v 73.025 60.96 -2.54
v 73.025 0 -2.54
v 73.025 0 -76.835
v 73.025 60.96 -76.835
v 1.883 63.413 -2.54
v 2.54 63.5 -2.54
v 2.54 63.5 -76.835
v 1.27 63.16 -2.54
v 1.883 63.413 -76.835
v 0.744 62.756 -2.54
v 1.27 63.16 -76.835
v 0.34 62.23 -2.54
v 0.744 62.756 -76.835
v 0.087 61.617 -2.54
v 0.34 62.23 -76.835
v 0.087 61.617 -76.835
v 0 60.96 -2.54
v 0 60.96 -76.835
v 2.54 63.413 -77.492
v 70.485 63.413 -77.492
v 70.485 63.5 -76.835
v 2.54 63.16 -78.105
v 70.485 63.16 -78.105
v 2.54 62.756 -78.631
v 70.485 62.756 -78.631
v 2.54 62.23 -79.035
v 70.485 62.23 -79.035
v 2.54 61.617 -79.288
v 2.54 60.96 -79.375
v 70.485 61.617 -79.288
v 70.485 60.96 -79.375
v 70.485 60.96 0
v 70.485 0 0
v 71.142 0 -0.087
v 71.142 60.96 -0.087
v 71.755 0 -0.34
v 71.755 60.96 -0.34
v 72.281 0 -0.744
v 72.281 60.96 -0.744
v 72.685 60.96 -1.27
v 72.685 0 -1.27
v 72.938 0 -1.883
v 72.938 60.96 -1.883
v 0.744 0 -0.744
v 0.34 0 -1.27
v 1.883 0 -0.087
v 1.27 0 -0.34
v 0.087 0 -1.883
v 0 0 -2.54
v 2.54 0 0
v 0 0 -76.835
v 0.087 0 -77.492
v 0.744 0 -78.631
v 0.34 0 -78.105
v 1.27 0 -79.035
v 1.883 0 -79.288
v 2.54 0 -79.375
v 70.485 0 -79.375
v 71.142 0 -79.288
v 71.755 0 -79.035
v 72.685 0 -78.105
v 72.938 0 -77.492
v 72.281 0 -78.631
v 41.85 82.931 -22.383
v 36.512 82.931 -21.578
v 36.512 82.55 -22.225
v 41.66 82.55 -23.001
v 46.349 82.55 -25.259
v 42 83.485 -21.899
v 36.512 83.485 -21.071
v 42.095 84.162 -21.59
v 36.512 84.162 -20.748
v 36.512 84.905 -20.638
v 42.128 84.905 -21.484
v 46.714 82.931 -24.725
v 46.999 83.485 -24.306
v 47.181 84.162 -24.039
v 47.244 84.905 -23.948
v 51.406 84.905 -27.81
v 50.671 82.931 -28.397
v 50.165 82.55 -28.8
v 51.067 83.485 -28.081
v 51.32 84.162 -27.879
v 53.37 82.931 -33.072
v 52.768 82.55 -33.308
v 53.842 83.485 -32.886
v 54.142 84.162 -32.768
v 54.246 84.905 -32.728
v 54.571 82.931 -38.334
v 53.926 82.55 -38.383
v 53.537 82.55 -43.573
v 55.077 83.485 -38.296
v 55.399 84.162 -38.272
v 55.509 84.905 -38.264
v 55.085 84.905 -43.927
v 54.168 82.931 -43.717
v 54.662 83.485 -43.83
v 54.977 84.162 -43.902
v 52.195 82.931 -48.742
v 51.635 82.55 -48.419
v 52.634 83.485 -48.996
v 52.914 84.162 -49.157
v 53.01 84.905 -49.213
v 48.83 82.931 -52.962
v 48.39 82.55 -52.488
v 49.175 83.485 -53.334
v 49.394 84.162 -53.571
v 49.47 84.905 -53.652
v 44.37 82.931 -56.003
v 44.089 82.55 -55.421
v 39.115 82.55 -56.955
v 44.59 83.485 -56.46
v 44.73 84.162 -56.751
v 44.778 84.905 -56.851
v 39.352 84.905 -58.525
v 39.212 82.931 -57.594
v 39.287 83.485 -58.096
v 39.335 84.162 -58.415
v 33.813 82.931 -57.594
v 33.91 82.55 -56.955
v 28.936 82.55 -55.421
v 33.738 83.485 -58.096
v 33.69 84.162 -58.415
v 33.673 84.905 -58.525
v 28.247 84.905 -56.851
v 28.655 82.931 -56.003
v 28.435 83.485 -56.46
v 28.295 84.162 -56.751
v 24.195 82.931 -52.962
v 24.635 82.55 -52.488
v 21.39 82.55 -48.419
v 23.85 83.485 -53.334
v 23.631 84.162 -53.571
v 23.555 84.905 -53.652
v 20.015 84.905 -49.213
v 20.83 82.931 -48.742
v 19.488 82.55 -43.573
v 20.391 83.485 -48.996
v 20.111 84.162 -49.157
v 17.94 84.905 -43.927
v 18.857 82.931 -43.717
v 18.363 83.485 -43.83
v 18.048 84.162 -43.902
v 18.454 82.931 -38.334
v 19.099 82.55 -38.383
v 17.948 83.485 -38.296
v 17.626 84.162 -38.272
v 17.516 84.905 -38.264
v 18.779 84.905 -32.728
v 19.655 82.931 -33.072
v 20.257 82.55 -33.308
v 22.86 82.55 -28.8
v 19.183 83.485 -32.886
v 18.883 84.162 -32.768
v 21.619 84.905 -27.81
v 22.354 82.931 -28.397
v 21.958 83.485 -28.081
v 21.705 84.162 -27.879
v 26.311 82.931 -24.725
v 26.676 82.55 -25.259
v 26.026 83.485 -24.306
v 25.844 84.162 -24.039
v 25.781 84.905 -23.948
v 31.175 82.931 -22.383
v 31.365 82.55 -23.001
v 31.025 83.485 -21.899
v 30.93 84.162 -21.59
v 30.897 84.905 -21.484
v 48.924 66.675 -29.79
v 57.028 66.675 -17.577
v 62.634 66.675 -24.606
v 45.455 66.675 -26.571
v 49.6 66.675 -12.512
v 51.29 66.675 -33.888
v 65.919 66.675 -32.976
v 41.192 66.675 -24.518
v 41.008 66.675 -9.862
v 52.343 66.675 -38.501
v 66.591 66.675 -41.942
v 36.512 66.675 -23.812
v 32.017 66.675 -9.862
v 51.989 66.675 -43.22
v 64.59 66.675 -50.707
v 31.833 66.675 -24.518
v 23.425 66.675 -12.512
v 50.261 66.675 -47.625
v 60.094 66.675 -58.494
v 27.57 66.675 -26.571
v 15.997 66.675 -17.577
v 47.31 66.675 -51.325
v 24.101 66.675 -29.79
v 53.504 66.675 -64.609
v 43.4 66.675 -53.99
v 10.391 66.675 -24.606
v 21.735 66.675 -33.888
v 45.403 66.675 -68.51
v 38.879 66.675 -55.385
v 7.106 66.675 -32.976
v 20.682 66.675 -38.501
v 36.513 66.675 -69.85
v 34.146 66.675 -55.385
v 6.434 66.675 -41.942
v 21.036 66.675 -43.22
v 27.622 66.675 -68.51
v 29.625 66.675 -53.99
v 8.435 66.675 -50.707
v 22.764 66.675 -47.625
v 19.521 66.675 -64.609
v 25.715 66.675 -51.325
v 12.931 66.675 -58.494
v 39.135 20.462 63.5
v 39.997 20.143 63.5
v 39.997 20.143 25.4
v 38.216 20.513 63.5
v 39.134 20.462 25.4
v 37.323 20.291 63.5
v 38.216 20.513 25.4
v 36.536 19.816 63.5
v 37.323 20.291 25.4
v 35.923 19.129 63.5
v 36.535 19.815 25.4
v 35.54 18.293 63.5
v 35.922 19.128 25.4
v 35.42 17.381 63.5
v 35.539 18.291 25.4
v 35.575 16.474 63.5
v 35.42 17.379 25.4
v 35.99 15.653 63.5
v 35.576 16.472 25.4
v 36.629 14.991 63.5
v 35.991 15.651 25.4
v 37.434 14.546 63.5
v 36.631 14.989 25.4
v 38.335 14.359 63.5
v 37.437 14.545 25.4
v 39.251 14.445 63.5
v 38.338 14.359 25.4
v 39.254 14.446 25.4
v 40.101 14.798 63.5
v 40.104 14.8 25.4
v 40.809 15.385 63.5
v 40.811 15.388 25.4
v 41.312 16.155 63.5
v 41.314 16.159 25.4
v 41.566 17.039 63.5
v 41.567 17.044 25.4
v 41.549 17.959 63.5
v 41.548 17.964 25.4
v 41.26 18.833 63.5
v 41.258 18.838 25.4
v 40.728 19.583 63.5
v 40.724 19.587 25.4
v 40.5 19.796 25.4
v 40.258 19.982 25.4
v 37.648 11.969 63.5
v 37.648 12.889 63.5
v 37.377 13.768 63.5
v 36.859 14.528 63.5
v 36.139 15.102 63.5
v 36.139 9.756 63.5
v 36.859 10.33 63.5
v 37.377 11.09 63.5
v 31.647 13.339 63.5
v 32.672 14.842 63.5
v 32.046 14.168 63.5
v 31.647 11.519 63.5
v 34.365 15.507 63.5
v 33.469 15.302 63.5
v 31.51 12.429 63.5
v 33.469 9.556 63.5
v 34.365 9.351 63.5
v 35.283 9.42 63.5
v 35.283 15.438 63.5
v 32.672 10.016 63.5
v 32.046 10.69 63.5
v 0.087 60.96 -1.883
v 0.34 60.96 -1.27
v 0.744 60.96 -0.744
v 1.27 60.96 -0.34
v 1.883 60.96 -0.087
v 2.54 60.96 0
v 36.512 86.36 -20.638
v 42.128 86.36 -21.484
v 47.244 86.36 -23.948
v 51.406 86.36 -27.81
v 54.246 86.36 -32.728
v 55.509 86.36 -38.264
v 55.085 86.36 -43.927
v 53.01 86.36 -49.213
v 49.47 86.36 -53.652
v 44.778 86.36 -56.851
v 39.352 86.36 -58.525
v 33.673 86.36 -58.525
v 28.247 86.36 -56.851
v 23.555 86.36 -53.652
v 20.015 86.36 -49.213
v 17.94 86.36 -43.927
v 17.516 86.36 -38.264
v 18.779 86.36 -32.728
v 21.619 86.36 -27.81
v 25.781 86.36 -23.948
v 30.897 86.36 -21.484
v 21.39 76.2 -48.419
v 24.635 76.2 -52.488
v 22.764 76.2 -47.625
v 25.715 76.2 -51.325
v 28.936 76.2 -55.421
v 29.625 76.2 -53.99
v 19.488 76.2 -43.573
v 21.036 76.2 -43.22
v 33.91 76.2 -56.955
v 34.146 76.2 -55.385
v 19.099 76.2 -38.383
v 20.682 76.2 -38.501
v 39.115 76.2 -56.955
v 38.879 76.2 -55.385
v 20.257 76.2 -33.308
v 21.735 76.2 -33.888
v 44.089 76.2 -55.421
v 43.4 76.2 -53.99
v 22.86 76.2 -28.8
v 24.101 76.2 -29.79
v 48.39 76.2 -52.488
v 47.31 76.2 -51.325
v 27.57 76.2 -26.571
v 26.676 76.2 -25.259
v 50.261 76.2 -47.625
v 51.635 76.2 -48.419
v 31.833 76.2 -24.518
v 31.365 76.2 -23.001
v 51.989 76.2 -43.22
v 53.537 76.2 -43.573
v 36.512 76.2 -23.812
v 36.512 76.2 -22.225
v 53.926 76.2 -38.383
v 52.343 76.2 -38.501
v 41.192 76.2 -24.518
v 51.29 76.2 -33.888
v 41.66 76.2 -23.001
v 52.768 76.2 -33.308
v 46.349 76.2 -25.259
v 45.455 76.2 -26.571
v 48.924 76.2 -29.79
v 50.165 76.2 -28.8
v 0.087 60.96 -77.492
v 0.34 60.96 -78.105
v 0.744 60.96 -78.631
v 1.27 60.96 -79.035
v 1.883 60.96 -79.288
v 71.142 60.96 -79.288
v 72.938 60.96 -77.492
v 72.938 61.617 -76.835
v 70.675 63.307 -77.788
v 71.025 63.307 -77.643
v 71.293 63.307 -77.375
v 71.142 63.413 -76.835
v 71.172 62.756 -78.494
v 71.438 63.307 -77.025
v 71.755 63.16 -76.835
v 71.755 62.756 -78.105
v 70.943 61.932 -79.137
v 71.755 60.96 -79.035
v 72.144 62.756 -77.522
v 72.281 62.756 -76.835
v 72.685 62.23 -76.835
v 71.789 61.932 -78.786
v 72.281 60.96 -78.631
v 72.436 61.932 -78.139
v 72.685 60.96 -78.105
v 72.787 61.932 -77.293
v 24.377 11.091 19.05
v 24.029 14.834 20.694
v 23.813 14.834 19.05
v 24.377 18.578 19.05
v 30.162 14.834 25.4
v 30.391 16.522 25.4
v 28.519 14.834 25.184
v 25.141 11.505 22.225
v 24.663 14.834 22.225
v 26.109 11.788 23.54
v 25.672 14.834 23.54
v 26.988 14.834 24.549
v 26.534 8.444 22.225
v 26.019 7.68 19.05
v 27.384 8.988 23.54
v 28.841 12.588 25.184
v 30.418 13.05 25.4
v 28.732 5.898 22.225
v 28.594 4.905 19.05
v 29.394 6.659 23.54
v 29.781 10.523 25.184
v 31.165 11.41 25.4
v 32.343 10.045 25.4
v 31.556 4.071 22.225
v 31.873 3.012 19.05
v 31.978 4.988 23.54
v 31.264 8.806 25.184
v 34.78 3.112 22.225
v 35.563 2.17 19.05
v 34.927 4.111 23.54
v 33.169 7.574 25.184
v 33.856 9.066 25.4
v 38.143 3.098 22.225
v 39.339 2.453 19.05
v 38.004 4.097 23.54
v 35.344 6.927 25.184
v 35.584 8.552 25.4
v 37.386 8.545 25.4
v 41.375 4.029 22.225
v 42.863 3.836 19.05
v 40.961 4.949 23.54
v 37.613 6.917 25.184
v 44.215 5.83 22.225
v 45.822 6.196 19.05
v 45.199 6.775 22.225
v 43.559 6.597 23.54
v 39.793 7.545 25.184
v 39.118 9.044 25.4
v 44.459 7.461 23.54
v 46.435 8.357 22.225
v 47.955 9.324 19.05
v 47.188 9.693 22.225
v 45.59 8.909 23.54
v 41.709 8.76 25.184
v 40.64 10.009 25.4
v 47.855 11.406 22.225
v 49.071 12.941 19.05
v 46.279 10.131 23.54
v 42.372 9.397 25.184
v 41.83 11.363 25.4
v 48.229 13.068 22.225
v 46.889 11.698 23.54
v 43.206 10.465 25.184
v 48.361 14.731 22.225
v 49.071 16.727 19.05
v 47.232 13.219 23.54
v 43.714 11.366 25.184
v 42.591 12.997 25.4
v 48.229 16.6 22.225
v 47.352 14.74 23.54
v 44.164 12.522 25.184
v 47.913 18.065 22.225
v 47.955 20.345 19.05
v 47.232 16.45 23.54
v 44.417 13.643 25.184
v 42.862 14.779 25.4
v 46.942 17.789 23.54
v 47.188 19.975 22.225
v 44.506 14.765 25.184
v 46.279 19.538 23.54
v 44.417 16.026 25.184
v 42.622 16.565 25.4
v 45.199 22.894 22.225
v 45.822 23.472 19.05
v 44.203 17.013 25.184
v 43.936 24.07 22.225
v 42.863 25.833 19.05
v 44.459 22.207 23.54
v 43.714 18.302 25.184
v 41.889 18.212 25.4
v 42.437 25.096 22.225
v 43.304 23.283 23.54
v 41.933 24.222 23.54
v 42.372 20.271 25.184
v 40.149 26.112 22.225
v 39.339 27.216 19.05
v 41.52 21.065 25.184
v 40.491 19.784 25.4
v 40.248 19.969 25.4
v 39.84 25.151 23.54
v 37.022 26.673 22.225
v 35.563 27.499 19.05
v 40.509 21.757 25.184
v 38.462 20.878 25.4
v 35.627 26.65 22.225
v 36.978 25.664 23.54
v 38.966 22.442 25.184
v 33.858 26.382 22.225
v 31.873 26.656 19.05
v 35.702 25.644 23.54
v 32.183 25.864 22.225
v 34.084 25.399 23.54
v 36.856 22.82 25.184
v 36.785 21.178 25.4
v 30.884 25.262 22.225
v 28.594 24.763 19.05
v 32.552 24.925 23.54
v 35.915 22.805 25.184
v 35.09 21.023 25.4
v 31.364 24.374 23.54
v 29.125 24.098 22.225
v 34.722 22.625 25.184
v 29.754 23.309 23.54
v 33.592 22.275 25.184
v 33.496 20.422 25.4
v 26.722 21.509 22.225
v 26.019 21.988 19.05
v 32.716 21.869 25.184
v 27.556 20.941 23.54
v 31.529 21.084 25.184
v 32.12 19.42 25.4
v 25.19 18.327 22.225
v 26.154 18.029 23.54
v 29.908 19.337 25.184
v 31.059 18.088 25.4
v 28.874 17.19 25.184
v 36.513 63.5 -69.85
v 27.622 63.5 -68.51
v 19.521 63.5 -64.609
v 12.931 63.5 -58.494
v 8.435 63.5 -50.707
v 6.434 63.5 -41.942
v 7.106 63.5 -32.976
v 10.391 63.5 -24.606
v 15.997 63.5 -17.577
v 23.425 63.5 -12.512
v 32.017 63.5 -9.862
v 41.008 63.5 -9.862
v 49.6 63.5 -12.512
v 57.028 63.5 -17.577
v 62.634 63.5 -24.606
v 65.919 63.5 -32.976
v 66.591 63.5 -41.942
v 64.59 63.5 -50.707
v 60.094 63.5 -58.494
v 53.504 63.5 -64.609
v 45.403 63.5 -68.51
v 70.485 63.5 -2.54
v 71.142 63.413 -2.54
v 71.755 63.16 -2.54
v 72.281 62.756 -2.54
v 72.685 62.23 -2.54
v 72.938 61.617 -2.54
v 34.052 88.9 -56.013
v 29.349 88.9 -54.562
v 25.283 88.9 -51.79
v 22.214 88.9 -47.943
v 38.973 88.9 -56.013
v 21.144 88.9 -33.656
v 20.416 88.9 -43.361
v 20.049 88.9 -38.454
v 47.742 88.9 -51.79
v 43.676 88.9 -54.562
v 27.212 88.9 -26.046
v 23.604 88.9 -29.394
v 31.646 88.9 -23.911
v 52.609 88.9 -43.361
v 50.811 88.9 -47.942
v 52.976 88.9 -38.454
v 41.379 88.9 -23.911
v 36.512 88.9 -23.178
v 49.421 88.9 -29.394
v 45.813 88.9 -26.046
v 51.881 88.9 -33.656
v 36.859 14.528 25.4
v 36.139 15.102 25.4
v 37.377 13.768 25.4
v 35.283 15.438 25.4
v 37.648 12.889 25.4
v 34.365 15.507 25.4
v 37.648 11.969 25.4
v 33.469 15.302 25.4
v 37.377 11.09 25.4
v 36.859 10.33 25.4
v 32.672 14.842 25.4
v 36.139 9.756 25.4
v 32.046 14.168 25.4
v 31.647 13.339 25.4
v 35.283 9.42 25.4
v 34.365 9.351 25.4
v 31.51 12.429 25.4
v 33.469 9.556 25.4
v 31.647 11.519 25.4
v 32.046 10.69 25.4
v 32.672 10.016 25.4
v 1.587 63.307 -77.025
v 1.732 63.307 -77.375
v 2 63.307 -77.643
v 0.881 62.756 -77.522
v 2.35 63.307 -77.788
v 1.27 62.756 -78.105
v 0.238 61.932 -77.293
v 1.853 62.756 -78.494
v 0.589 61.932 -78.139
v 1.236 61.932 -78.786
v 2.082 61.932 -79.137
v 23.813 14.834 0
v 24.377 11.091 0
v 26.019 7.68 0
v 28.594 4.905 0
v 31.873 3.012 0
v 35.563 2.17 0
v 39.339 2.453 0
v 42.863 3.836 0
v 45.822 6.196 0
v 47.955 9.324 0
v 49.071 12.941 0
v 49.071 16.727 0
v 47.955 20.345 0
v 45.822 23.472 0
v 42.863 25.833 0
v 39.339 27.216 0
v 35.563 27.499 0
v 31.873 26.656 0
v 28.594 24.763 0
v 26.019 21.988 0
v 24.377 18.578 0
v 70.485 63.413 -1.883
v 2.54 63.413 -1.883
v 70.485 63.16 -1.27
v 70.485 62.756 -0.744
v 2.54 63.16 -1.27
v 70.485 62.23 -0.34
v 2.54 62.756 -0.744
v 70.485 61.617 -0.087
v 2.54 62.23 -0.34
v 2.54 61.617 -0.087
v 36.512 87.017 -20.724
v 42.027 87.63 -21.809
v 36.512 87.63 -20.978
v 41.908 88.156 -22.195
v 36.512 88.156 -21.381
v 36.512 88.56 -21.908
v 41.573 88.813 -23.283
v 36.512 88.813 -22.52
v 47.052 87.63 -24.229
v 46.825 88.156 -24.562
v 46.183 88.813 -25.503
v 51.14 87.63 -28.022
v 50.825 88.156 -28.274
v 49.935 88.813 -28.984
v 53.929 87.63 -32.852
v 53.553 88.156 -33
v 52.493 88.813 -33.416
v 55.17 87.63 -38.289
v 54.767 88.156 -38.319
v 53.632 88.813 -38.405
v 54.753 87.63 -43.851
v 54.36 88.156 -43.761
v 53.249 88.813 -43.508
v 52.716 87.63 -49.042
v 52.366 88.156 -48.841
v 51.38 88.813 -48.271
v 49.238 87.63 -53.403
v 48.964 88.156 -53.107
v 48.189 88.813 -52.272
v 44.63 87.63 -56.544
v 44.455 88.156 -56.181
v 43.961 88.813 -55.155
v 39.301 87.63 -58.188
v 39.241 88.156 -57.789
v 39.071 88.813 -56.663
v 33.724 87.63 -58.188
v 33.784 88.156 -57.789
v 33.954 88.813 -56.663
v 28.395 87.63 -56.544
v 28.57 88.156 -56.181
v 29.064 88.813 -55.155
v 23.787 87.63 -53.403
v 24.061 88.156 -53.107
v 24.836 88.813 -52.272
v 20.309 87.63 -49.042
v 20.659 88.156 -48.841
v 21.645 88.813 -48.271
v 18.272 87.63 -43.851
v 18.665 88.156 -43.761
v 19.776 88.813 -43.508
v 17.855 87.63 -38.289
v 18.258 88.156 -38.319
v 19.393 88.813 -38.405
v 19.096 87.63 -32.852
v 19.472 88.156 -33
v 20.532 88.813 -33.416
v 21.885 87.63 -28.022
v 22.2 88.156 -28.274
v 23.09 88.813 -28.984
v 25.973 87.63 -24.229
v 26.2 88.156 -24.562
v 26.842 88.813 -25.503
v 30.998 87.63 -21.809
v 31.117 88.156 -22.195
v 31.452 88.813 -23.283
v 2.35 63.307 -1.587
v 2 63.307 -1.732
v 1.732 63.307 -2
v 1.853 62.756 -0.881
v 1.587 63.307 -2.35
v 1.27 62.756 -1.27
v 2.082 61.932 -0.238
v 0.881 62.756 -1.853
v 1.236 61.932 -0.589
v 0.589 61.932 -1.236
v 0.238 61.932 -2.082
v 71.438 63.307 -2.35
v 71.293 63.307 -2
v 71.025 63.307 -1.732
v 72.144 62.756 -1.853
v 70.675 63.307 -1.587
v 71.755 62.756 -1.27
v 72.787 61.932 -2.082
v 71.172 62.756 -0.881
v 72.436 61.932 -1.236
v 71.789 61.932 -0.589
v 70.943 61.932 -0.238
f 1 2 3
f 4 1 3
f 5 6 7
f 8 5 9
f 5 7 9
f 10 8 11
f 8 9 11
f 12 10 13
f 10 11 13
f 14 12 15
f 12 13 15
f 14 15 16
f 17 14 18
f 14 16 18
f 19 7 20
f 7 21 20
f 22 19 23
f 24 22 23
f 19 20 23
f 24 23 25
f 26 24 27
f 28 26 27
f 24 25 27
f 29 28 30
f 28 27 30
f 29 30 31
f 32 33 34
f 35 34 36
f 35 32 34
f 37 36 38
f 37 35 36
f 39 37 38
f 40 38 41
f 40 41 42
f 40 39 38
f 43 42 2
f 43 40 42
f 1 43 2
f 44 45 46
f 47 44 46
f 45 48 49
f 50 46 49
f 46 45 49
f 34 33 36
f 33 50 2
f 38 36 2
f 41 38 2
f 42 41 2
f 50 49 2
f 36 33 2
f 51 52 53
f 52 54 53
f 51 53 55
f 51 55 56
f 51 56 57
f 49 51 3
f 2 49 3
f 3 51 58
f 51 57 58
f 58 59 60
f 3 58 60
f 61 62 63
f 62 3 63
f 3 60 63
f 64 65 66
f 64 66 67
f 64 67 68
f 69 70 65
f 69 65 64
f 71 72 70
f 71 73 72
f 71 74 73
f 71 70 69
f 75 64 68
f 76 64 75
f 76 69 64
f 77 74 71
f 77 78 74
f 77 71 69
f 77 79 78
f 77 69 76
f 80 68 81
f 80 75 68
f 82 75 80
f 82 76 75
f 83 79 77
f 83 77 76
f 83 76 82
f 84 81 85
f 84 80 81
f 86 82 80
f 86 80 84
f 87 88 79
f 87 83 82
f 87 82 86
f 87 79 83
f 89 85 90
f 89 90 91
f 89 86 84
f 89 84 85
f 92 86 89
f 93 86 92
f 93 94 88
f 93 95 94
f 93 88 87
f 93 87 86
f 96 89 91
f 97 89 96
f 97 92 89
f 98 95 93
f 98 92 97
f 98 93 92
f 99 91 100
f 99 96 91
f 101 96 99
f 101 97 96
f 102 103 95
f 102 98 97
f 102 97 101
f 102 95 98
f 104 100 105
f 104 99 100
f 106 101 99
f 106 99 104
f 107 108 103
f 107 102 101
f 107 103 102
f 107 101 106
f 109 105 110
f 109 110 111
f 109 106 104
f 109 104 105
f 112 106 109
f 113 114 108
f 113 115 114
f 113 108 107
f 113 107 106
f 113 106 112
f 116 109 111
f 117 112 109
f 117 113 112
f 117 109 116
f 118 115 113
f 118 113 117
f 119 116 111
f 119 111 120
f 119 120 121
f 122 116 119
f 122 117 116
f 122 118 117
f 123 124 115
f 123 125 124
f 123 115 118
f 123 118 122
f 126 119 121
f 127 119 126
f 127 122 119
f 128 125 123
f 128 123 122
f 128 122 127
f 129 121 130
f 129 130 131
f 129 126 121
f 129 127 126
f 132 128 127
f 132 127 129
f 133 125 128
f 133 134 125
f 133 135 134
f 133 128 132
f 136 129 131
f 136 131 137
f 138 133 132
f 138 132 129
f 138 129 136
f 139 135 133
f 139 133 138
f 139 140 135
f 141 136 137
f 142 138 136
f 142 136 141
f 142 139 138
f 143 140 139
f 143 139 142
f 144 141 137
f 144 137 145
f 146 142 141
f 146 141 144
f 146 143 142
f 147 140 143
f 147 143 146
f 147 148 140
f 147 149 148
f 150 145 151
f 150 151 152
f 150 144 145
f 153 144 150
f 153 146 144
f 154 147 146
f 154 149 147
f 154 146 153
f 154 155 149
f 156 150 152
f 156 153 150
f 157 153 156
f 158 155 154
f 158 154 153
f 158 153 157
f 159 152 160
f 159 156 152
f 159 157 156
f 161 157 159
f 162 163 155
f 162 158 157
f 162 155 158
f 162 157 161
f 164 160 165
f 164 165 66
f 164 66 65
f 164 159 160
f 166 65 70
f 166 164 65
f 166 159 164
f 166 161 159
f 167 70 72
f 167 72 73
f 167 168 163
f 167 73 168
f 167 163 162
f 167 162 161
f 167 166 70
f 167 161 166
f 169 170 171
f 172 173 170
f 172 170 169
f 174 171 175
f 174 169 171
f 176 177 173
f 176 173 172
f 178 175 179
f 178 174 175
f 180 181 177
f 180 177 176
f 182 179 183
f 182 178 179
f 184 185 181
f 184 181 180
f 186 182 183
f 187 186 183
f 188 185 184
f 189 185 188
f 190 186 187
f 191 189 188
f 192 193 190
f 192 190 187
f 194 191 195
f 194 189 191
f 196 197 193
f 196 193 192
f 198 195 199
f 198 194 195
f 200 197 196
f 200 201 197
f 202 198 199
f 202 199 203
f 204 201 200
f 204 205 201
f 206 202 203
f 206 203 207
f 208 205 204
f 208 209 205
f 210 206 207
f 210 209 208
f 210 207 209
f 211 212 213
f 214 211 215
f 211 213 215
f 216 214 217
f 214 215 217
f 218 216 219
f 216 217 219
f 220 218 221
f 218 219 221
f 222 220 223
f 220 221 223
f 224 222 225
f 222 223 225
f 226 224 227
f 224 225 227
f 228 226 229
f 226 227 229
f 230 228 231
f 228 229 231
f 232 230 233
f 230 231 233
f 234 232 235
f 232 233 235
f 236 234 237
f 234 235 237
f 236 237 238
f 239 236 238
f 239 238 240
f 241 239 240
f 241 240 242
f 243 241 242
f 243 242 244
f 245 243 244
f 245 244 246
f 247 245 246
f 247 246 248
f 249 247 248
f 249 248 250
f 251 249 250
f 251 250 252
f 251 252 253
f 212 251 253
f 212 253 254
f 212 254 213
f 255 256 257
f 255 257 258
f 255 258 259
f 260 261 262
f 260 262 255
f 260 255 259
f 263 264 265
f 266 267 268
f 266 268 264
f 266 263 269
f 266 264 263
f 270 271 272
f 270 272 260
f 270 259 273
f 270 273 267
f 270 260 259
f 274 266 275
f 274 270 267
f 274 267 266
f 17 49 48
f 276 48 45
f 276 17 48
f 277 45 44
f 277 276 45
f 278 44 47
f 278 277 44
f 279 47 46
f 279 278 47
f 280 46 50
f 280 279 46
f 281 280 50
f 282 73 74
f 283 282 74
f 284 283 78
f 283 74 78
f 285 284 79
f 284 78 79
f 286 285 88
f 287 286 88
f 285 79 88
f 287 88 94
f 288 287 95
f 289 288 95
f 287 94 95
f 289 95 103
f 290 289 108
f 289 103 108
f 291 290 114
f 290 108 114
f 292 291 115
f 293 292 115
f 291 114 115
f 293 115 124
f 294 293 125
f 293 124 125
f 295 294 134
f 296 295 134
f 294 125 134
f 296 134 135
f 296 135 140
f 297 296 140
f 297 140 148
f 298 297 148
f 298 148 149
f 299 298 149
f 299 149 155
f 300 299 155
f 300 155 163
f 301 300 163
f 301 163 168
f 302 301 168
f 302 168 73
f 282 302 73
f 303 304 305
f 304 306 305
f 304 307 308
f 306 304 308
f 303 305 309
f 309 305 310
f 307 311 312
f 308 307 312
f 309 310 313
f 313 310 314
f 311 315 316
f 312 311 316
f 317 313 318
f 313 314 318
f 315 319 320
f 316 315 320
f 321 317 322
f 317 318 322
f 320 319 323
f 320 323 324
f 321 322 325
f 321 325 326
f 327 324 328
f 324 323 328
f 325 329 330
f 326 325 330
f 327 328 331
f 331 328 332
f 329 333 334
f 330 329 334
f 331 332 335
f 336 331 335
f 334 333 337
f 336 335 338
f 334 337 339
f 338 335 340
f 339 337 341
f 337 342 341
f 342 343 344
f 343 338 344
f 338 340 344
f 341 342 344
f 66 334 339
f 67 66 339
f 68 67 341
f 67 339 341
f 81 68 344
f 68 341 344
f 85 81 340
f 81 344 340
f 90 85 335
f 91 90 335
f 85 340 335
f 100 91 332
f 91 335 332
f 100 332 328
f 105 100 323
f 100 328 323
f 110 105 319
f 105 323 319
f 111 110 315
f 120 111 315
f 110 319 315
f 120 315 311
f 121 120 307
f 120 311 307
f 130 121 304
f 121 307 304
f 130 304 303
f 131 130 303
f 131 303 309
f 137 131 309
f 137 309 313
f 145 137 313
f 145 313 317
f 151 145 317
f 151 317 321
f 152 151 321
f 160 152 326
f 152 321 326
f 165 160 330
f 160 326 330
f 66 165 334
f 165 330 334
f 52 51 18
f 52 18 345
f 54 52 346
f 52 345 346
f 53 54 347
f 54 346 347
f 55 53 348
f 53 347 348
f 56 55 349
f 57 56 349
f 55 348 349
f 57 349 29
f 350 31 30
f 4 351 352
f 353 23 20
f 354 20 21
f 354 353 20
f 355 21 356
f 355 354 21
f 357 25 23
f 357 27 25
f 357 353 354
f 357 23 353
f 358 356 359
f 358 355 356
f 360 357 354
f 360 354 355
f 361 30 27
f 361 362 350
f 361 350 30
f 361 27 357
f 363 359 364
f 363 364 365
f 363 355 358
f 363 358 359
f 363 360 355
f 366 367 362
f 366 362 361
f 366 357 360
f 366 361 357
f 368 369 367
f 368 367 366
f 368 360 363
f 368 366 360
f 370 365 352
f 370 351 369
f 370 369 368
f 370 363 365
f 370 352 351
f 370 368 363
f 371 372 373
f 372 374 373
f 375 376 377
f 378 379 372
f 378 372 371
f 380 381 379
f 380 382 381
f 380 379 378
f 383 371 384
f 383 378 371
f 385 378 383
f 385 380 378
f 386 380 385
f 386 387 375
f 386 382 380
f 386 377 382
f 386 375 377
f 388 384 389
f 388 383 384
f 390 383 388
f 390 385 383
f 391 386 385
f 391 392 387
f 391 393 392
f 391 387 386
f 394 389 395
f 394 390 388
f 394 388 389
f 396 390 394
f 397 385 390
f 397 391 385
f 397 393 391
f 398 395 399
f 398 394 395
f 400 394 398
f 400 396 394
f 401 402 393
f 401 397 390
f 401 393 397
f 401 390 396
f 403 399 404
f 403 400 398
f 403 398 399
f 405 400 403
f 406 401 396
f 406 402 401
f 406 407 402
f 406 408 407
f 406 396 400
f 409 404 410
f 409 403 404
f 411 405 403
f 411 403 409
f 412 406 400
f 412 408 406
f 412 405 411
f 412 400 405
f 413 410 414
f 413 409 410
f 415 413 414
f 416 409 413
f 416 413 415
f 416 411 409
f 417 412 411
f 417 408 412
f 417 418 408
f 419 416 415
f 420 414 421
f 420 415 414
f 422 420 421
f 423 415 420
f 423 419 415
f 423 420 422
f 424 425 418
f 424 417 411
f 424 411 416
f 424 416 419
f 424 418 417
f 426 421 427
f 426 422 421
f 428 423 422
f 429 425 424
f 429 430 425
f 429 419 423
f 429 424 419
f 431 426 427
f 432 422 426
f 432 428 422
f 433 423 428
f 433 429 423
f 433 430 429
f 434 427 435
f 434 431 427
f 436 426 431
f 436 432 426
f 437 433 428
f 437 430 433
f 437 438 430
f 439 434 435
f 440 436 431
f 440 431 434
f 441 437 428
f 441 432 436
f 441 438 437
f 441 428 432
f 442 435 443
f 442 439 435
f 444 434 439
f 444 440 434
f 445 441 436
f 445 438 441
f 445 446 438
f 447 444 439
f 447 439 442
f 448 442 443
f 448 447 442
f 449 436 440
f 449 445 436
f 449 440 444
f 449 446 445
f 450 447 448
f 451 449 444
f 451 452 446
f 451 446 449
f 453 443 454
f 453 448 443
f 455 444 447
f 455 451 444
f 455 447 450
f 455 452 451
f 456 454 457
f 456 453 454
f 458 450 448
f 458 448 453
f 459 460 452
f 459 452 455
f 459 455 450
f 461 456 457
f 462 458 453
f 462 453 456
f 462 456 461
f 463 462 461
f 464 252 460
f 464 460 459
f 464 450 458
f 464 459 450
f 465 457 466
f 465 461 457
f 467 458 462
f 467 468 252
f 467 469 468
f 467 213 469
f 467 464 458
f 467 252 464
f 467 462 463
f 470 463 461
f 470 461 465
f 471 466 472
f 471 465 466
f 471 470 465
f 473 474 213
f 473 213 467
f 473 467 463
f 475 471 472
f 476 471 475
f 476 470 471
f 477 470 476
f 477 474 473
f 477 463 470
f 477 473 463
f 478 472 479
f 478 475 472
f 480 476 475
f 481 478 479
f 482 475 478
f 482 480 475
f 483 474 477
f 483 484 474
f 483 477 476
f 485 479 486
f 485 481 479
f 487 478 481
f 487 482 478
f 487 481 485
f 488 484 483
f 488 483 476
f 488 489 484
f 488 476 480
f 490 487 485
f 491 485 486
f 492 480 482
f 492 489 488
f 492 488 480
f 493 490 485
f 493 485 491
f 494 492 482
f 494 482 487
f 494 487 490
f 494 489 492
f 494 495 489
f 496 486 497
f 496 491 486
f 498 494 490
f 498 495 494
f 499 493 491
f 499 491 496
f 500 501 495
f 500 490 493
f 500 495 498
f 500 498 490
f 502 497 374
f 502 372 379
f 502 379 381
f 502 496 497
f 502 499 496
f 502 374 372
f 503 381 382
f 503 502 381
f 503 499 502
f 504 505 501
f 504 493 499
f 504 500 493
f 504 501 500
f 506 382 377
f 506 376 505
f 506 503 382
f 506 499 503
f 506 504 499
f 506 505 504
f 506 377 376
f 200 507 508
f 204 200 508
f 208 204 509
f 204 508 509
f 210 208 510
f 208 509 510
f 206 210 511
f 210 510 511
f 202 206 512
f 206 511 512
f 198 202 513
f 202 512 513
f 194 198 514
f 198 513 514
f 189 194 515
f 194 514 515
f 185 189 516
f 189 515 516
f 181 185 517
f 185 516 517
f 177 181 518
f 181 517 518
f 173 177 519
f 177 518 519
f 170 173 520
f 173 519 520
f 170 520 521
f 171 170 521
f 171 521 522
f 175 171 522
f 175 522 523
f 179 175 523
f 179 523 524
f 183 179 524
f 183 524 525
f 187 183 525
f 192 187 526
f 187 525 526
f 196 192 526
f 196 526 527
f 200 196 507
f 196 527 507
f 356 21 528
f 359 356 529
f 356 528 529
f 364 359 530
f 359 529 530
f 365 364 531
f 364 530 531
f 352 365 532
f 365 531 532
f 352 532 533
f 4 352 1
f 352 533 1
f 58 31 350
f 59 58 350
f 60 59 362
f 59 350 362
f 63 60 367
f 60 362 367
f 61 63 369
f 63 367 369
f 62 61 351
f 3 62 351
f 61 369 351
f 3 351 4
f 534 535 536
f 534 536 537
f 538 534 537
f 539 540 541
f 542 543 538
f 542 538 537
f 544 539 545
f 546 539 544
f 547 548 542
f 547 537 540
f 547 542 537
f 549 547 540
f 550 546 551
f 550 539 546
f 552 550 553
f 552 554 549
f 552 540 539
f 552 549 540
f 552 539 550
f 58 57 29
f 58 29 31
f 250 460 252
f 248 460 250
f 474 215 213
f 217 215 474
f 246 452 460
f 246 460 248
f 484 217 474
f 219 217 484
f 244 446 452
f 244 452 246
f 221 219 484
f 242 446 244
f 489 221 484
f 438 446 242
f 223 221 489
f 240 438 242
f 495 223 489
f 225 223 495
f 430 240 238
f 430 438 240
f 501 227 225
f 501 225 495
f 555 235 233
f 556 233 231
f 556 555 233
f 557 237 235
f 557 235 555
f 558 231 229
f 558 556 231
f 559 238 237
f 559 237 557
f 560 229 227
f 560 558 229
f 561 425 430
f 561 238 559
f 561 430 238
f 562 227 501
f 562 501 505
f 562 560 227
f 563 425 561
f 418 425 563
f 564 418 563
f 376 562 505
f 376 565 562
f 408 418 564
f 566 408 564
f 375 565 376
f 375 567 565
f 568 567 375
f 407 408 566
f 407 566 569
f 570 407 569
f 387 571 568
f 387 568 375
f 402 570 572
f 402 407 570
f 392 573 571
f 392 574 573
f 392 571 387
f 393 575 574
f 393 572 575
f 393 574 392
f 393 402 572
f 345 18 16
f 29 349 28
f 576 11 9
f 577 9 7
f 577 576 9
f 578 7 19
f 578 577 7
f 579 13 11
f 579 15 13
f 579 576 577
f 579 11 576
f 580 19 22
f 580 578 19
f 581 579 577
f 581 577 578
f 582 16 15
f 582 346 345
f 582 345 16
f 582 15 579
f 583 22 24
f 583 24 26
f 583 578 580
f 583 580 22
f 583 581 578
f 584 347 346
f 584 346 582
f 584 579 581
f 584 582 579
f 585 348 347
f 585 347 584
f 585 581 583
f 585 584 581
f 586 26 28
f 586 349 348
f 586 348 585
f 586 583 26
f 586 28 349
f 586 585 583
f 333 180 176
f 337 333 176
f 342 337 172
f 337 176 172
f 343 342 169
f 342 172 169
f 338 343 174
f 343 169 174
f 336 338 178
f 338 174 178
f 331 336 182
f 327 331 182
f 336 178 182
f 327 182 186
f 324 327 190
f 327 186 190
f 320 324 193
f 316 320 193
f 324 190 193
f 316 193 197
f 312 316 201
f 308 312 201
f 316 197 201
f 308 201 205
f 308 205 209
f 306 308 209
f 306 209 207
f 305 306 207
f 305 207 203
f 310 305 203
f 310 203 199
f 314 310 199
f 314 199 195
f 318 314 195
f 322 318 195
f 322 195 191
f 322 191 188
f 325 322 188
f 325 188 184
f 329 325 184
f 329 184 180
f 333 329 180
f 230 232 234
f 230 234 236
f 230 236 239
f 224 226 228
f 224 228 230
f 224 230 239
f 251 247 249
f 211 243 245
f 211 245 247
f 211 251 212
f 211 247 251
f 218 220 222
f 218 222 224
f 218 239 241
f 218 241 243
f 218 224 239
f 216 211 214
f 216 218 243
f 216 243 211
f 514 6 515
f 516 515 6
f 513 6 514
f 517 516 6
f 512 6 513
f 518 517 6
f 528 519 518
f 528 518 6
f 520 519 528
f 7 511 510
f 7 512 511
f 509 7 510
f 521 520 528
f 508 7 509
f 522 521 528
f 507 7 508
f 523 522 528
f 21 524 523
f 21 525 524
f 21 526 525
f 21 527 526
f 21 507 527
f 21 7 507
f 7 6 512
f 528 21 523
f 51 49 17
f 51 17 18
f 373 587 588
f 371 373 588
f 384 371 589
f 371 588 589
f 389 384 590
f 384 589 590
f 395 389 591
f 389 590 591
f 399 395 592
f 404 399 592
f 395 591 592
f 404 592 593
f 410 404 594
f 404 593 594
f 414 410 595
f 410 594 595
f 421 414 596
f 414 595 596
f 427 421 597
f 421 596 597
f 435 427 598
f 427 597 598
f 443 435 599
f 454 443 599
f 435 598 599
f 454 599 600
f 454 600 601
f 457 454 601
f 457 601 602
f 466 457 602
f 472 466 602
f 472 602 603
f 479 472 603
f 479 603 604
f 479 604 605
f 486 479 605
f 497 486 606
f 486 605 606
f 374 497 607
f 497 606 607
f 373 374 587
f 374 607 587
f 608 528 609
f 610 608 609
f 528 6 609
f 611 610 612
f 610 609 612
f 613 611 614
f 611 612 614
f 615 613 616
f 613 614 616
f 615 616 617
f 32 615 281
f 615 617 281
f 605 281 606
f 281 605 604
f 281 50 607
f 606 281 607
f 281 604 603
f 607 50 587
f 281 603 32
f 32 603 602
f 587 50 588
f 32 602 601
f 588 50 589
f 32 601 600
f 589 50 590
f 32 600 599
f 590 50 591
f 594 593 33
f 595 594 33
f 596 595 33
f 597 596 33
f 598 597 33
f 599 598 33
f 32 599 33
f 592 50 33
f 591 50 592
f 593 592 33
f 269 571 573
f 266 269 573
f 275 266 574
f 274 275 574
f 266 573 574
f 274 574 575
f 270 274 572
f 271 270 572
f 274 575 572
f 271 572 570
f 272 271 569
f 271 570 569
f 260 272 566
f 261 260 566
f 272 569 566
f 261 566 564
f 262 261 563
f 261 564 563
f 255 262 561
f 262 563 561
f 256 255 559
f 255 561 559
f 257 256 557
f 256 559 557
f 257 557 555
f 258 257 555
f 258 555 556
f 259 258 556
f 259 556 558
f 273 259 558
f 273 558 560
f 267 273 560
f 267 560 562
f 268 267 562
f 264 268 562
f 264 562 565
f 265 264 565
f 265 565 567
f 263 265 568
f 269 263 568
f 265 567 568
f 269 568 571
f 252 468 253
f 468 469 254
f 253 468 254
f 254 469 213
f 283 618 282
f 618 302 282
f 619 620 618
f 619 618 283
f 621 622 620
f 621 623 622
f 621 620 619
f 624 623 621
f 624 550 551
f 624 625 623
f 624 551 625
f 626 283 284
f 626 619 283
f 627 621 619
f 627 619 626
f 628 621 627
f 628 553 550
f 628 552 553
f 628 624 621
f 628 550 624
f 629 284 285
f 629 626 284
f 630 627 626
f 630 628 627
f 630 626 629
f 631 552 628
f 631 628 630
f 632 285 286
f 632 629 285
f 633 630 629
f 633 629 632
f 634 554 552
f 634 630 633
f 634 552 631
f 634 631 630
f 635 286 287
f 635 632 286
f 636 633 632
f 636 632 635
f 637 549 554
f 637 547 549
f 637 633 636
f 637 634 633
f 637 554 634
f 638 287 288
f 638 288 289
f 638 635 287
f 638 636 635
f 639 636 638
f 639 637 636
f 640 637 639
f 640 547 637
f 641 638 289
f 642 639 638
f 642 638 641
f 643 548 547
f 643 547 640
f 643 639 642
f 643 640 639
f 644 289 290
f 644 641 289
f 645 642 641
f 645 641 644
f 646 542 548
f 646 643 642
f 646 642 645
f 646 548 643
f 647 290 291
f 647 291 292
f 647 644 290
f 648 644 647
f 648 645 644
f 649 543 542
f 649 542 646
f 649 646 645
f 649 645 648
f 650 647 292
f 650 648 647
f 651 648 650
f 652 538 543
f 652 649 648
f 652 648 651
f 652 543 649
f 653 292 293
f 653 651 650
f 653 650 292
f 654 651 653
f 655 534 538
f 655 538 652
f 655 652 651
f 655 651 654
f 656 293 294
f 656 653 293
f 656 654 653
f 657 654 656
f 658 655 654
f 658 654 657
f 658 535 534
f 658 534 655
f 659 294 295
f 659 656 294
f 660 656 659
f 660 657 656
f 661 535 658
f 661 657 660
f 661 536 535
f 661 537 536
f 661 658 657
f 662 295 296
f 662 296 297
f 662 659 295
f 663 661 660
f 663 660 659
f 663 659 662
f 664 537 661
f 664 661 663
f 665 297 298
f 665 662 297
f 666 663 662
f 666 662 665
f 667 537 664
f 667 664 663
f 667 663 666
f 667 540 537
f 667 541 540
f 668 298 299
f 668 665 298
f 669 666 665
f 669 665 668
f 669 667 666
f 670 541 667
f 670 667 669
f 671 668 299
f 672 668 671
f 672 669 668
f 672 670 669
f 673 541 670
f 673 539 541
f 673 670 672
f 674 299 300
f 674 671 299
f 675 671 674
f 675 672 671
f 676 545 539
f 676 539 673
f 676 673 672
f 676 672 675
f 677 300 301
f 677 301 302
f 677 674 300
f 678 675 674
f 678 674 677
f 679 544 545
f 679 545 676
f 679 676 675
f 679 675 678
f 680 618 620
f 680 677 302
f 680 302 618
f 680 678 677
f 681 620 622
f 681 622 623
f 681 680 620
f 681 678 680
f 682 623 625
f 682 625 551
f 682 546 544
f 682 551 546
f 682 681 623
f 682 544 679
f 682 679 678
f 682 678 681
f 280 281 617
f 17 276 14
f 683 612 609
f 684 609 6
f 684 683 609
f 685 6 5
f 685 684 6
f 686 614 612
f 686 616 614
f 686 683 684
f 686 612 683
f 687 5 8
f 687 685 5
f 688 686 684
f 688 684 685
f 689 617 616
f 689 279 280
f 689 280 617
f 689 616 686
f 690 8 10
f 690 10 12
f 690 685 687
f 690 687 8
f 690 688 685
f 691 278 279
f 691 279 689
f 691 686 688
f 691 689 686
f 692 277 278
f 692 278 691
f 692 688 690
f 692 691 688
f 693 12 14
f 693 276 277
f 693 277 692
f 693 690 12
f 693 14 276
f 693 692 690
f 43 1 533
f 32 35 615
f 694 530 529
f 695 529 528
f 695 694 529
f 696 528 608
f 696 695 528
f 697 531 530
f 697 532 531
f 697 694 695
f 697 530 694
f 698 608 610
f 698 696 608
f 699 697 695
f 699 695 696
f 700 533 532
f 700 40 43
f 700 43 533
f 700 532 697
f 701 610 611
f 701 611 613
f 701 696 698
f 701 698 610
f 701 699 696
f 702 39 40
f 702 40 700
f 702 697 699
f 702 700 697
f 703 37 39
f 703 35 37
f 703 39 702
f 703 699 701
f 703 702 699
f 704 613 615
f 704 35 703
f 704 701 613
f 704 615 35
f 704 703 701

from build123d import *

# Parameters (mm, degrees)
SKETCH1_W           = 73.025
SKETCH1_H           = 79.375
BOSS_EXTRUDE1_DEPTH = 63.5
SKETCH2_R           = 15.875
BOSS_EXTRUDE2_DEPTH = 12.7
SKETCH3_R           = 30.1625
BOSS_EXTRUDE3_DEPTH = 3.175
SKETCH4_R           = 17.4625
BOSS_EXTRUDE4_DEPTH = 6.35
SKETCH5_R           = 19.05
BOSS_EXTRUDE5_DEPTH = 6.35
FILLET1_R           = 2.54
FILLET2_R           = 2.54
FILLET5_R           = 2.54
SKETCH7_R           = 12.7
BOSS_EXTRUDE7_DEPTH = 25.4
FILLET6_R           = 6.35
SKETCH8_R           = 3.086351458
BOSS_EXTRUDE8_DEPTH = 38.1


with BuildPart() as part:
    # Sketch1 → Boss-Extrude1 (new body)
    with BuildSketch(Plane(origin=(0, 0, 0), x_dir=(1, 0, 0), z_dir=(0, 1, 0))):
        with Locations((36.5125, 39.6875)):
            Rectangle(SKETCH1_W, SKETCH1_H)
    extrude(amount=BOSS_EXTRUDE1_DEPTH)

    # Sketch2 → Boss-Extrude2 (add)
    with BuildSketch(Plane(origin=(0, 63.5, 0), x_dir=(1, 0, 0), z_dir=(0, 1, 0))):
        with Locations(Location((36.5125, 39.6875, 0), (0, 0, 270))):
            Circle(SKETCH2_R)
    extrude(amount=BOSS_EXTRUDE2_DEPTH)

    # Sketch3 → Boss-Extrude3 (add)
    with BuildSketch(Plane(origin=(0, 63.5, 0), x_dir=(1, 0, 0), z_dir=(0, 1, 0))):
        with Locations(Location((36.5125, 39.6875, 0), (0, 0, 90))):
            Circle(SKETCH3_R)
    extrude(amount=BOSS_EXTRUDE3_DEPTH)

    # Sketch4 → Boss-Extrude4 (add)
    with BuildSketch(Plane(origin=(0, 76.2, 0), x_dir=(1, 0, 0), z_dir=(0, 1, 0))):
        with Locations(Location((36.5125, 39.6875, 0), (0, 0, 270))):
            Circle(SKETCH4_R)
    extrude(amount=BOSS_EXTRUDE4_DEPTH)

    # Sketch5 → Boss-Extrude5 (add)
    with BuildSketch(Plane(origin=(0, 82.55, 0), x_dir=(1, 0, 0), z_dir=(0, 1, 0))):
        with Locations(Location((36.5125, 39.6875, 0), (0, 0, 270))):
            Circle(SKETCH5_R)
    extrude(amount=BOSS_EXTRUDE5_DEPTH)

    # Fillet1
    # the kernel refuses this fillet: 2.54 mm, written as the material it takes off along each edge
    with BuildSketch(Plane(origin=(36.5125, 82.55, -39.6875), x_dir=(0, 0, 1), z_dir=(-1, 0, 0))) as fillet1_piece_1:
        with BuildLine():
            CenterArc((16.51, 2.35464302), FILLET1_R, 292.024312837, 67.975687163)
            Line((17.4625, 0), (17.48155, -0.04709286))
            ThreePointArc((17.48155, -0.04709286), (18.25625, -0.0508), (19.05, -0.0508))
            Line((19.05, -0.0508), (19.1008, 0))
            Line((19.1008, 0), (19.1008, 2.35464302))
            Line((19.1008, 2.35464302), (19.05, 2.35464302))
        make_face()
    revolve(axis=Axis((36.5125, 82.55, -39.6875), (0, 1, 0)), mode=Mode.SUBTRACT)
    with BuildSketch(Plane(origin=(36.5125, 88.9, -39.6875), x_dir=(0, 0, 1), z_dir=(-1, 0, 0))) as fillet1_piece_2:
        with BuildLine():
            CenterArc((19.05 - FILLET1_R, -FILLET1_R), FILLET1_R, 0, 90)
            Line((19.05 - FILLET1_R, 0), (19.05 - FILLET1_R, FILLET1_R * 0.02))
            Line((19.05 - FILLET1_R, FILLET1_R * 0.02), (19.05 + FILLET1_R * 0.02, FILLET1_R * 0.02))
            Line((19.05 + FILLET1_R * 0.02, FILLET1_R * 0.02), (19.05 + FILLET1_R * 0.02, -FILLET1_R))
            Line((19.05 + FILLET1_R * 0.02, -FILLET1_R), (19.05, -FILLET1_R))
        make_face()
    revolve(axis=Axis((36.5125, 88.9, -39.6875), (0, 1, 0)), mode=Mode.SUBTRACT)

    # Fillet2
    fillet2_edges = [part.edges().sort_by_distance(p)[0] for p in [
        (0, 31.75, 0),
        (73.025, 31.75, 0),
        (73.025, 31.75, -79.375),
        (0, 31.75, -79.375),
    ]]
    fillet(fillet2_edges, radius=FILLET2_R)

    # Fillet5
    fillet5_edges = [part.edges().sort_by_distance(p)[0] for p in [
        (36.5125, 63.5, -79.375),
        (73.025, 63.5, -39.6875),
        (0, 63.5, -39.6875),
        (36.5125, 63.5, 0),
        (0.743948776, 63.5, -78.631051224),
        (0.743948776, 63.5, -0.743948776),
        (72.281051224, 63.5, -0.743948776),
        (72.281051224, 63.5, -78.631051224),
    ]]
    fillet(fillet5_edges, radius=FILLET5_R)

    # Sketch7 → Boss-Extrude7 (add)
    with BuildSketch(Plane.XY):
        with Locations(Location((36.5125, 14.834220105, 0), (0, 0, 180))):
            Circle(SKETCH7_R)
    extrude(amount=BOSS_EXTRUDE7_DEPTH)

    # Fillet6
    fillet6_edges = [part.edges().sort_by_distance(p)[0] for p in [
        (49.2125, 14.834220105, 25.4),
    ]]
    fillet(fillet6_edges, radius=FILLET6_R)

    # Sketch8 → Boss-Extrude8 (add)
    with BuildSketch(Plane.XY.offset(25.4)):
        with Locations(Location((38.506076801, 17.440379035, 0), (0, 0, 61.105176003))):
            Circle(SKETCH8_R)
        with Locations(Location((34.596139796, 12.429051324, 0), (0, 0, 180))):
            Circle(SKETCH8_R)
    extrude(amount=BOSS_EXTRUDE8_DEPTH)


solid = part.part
